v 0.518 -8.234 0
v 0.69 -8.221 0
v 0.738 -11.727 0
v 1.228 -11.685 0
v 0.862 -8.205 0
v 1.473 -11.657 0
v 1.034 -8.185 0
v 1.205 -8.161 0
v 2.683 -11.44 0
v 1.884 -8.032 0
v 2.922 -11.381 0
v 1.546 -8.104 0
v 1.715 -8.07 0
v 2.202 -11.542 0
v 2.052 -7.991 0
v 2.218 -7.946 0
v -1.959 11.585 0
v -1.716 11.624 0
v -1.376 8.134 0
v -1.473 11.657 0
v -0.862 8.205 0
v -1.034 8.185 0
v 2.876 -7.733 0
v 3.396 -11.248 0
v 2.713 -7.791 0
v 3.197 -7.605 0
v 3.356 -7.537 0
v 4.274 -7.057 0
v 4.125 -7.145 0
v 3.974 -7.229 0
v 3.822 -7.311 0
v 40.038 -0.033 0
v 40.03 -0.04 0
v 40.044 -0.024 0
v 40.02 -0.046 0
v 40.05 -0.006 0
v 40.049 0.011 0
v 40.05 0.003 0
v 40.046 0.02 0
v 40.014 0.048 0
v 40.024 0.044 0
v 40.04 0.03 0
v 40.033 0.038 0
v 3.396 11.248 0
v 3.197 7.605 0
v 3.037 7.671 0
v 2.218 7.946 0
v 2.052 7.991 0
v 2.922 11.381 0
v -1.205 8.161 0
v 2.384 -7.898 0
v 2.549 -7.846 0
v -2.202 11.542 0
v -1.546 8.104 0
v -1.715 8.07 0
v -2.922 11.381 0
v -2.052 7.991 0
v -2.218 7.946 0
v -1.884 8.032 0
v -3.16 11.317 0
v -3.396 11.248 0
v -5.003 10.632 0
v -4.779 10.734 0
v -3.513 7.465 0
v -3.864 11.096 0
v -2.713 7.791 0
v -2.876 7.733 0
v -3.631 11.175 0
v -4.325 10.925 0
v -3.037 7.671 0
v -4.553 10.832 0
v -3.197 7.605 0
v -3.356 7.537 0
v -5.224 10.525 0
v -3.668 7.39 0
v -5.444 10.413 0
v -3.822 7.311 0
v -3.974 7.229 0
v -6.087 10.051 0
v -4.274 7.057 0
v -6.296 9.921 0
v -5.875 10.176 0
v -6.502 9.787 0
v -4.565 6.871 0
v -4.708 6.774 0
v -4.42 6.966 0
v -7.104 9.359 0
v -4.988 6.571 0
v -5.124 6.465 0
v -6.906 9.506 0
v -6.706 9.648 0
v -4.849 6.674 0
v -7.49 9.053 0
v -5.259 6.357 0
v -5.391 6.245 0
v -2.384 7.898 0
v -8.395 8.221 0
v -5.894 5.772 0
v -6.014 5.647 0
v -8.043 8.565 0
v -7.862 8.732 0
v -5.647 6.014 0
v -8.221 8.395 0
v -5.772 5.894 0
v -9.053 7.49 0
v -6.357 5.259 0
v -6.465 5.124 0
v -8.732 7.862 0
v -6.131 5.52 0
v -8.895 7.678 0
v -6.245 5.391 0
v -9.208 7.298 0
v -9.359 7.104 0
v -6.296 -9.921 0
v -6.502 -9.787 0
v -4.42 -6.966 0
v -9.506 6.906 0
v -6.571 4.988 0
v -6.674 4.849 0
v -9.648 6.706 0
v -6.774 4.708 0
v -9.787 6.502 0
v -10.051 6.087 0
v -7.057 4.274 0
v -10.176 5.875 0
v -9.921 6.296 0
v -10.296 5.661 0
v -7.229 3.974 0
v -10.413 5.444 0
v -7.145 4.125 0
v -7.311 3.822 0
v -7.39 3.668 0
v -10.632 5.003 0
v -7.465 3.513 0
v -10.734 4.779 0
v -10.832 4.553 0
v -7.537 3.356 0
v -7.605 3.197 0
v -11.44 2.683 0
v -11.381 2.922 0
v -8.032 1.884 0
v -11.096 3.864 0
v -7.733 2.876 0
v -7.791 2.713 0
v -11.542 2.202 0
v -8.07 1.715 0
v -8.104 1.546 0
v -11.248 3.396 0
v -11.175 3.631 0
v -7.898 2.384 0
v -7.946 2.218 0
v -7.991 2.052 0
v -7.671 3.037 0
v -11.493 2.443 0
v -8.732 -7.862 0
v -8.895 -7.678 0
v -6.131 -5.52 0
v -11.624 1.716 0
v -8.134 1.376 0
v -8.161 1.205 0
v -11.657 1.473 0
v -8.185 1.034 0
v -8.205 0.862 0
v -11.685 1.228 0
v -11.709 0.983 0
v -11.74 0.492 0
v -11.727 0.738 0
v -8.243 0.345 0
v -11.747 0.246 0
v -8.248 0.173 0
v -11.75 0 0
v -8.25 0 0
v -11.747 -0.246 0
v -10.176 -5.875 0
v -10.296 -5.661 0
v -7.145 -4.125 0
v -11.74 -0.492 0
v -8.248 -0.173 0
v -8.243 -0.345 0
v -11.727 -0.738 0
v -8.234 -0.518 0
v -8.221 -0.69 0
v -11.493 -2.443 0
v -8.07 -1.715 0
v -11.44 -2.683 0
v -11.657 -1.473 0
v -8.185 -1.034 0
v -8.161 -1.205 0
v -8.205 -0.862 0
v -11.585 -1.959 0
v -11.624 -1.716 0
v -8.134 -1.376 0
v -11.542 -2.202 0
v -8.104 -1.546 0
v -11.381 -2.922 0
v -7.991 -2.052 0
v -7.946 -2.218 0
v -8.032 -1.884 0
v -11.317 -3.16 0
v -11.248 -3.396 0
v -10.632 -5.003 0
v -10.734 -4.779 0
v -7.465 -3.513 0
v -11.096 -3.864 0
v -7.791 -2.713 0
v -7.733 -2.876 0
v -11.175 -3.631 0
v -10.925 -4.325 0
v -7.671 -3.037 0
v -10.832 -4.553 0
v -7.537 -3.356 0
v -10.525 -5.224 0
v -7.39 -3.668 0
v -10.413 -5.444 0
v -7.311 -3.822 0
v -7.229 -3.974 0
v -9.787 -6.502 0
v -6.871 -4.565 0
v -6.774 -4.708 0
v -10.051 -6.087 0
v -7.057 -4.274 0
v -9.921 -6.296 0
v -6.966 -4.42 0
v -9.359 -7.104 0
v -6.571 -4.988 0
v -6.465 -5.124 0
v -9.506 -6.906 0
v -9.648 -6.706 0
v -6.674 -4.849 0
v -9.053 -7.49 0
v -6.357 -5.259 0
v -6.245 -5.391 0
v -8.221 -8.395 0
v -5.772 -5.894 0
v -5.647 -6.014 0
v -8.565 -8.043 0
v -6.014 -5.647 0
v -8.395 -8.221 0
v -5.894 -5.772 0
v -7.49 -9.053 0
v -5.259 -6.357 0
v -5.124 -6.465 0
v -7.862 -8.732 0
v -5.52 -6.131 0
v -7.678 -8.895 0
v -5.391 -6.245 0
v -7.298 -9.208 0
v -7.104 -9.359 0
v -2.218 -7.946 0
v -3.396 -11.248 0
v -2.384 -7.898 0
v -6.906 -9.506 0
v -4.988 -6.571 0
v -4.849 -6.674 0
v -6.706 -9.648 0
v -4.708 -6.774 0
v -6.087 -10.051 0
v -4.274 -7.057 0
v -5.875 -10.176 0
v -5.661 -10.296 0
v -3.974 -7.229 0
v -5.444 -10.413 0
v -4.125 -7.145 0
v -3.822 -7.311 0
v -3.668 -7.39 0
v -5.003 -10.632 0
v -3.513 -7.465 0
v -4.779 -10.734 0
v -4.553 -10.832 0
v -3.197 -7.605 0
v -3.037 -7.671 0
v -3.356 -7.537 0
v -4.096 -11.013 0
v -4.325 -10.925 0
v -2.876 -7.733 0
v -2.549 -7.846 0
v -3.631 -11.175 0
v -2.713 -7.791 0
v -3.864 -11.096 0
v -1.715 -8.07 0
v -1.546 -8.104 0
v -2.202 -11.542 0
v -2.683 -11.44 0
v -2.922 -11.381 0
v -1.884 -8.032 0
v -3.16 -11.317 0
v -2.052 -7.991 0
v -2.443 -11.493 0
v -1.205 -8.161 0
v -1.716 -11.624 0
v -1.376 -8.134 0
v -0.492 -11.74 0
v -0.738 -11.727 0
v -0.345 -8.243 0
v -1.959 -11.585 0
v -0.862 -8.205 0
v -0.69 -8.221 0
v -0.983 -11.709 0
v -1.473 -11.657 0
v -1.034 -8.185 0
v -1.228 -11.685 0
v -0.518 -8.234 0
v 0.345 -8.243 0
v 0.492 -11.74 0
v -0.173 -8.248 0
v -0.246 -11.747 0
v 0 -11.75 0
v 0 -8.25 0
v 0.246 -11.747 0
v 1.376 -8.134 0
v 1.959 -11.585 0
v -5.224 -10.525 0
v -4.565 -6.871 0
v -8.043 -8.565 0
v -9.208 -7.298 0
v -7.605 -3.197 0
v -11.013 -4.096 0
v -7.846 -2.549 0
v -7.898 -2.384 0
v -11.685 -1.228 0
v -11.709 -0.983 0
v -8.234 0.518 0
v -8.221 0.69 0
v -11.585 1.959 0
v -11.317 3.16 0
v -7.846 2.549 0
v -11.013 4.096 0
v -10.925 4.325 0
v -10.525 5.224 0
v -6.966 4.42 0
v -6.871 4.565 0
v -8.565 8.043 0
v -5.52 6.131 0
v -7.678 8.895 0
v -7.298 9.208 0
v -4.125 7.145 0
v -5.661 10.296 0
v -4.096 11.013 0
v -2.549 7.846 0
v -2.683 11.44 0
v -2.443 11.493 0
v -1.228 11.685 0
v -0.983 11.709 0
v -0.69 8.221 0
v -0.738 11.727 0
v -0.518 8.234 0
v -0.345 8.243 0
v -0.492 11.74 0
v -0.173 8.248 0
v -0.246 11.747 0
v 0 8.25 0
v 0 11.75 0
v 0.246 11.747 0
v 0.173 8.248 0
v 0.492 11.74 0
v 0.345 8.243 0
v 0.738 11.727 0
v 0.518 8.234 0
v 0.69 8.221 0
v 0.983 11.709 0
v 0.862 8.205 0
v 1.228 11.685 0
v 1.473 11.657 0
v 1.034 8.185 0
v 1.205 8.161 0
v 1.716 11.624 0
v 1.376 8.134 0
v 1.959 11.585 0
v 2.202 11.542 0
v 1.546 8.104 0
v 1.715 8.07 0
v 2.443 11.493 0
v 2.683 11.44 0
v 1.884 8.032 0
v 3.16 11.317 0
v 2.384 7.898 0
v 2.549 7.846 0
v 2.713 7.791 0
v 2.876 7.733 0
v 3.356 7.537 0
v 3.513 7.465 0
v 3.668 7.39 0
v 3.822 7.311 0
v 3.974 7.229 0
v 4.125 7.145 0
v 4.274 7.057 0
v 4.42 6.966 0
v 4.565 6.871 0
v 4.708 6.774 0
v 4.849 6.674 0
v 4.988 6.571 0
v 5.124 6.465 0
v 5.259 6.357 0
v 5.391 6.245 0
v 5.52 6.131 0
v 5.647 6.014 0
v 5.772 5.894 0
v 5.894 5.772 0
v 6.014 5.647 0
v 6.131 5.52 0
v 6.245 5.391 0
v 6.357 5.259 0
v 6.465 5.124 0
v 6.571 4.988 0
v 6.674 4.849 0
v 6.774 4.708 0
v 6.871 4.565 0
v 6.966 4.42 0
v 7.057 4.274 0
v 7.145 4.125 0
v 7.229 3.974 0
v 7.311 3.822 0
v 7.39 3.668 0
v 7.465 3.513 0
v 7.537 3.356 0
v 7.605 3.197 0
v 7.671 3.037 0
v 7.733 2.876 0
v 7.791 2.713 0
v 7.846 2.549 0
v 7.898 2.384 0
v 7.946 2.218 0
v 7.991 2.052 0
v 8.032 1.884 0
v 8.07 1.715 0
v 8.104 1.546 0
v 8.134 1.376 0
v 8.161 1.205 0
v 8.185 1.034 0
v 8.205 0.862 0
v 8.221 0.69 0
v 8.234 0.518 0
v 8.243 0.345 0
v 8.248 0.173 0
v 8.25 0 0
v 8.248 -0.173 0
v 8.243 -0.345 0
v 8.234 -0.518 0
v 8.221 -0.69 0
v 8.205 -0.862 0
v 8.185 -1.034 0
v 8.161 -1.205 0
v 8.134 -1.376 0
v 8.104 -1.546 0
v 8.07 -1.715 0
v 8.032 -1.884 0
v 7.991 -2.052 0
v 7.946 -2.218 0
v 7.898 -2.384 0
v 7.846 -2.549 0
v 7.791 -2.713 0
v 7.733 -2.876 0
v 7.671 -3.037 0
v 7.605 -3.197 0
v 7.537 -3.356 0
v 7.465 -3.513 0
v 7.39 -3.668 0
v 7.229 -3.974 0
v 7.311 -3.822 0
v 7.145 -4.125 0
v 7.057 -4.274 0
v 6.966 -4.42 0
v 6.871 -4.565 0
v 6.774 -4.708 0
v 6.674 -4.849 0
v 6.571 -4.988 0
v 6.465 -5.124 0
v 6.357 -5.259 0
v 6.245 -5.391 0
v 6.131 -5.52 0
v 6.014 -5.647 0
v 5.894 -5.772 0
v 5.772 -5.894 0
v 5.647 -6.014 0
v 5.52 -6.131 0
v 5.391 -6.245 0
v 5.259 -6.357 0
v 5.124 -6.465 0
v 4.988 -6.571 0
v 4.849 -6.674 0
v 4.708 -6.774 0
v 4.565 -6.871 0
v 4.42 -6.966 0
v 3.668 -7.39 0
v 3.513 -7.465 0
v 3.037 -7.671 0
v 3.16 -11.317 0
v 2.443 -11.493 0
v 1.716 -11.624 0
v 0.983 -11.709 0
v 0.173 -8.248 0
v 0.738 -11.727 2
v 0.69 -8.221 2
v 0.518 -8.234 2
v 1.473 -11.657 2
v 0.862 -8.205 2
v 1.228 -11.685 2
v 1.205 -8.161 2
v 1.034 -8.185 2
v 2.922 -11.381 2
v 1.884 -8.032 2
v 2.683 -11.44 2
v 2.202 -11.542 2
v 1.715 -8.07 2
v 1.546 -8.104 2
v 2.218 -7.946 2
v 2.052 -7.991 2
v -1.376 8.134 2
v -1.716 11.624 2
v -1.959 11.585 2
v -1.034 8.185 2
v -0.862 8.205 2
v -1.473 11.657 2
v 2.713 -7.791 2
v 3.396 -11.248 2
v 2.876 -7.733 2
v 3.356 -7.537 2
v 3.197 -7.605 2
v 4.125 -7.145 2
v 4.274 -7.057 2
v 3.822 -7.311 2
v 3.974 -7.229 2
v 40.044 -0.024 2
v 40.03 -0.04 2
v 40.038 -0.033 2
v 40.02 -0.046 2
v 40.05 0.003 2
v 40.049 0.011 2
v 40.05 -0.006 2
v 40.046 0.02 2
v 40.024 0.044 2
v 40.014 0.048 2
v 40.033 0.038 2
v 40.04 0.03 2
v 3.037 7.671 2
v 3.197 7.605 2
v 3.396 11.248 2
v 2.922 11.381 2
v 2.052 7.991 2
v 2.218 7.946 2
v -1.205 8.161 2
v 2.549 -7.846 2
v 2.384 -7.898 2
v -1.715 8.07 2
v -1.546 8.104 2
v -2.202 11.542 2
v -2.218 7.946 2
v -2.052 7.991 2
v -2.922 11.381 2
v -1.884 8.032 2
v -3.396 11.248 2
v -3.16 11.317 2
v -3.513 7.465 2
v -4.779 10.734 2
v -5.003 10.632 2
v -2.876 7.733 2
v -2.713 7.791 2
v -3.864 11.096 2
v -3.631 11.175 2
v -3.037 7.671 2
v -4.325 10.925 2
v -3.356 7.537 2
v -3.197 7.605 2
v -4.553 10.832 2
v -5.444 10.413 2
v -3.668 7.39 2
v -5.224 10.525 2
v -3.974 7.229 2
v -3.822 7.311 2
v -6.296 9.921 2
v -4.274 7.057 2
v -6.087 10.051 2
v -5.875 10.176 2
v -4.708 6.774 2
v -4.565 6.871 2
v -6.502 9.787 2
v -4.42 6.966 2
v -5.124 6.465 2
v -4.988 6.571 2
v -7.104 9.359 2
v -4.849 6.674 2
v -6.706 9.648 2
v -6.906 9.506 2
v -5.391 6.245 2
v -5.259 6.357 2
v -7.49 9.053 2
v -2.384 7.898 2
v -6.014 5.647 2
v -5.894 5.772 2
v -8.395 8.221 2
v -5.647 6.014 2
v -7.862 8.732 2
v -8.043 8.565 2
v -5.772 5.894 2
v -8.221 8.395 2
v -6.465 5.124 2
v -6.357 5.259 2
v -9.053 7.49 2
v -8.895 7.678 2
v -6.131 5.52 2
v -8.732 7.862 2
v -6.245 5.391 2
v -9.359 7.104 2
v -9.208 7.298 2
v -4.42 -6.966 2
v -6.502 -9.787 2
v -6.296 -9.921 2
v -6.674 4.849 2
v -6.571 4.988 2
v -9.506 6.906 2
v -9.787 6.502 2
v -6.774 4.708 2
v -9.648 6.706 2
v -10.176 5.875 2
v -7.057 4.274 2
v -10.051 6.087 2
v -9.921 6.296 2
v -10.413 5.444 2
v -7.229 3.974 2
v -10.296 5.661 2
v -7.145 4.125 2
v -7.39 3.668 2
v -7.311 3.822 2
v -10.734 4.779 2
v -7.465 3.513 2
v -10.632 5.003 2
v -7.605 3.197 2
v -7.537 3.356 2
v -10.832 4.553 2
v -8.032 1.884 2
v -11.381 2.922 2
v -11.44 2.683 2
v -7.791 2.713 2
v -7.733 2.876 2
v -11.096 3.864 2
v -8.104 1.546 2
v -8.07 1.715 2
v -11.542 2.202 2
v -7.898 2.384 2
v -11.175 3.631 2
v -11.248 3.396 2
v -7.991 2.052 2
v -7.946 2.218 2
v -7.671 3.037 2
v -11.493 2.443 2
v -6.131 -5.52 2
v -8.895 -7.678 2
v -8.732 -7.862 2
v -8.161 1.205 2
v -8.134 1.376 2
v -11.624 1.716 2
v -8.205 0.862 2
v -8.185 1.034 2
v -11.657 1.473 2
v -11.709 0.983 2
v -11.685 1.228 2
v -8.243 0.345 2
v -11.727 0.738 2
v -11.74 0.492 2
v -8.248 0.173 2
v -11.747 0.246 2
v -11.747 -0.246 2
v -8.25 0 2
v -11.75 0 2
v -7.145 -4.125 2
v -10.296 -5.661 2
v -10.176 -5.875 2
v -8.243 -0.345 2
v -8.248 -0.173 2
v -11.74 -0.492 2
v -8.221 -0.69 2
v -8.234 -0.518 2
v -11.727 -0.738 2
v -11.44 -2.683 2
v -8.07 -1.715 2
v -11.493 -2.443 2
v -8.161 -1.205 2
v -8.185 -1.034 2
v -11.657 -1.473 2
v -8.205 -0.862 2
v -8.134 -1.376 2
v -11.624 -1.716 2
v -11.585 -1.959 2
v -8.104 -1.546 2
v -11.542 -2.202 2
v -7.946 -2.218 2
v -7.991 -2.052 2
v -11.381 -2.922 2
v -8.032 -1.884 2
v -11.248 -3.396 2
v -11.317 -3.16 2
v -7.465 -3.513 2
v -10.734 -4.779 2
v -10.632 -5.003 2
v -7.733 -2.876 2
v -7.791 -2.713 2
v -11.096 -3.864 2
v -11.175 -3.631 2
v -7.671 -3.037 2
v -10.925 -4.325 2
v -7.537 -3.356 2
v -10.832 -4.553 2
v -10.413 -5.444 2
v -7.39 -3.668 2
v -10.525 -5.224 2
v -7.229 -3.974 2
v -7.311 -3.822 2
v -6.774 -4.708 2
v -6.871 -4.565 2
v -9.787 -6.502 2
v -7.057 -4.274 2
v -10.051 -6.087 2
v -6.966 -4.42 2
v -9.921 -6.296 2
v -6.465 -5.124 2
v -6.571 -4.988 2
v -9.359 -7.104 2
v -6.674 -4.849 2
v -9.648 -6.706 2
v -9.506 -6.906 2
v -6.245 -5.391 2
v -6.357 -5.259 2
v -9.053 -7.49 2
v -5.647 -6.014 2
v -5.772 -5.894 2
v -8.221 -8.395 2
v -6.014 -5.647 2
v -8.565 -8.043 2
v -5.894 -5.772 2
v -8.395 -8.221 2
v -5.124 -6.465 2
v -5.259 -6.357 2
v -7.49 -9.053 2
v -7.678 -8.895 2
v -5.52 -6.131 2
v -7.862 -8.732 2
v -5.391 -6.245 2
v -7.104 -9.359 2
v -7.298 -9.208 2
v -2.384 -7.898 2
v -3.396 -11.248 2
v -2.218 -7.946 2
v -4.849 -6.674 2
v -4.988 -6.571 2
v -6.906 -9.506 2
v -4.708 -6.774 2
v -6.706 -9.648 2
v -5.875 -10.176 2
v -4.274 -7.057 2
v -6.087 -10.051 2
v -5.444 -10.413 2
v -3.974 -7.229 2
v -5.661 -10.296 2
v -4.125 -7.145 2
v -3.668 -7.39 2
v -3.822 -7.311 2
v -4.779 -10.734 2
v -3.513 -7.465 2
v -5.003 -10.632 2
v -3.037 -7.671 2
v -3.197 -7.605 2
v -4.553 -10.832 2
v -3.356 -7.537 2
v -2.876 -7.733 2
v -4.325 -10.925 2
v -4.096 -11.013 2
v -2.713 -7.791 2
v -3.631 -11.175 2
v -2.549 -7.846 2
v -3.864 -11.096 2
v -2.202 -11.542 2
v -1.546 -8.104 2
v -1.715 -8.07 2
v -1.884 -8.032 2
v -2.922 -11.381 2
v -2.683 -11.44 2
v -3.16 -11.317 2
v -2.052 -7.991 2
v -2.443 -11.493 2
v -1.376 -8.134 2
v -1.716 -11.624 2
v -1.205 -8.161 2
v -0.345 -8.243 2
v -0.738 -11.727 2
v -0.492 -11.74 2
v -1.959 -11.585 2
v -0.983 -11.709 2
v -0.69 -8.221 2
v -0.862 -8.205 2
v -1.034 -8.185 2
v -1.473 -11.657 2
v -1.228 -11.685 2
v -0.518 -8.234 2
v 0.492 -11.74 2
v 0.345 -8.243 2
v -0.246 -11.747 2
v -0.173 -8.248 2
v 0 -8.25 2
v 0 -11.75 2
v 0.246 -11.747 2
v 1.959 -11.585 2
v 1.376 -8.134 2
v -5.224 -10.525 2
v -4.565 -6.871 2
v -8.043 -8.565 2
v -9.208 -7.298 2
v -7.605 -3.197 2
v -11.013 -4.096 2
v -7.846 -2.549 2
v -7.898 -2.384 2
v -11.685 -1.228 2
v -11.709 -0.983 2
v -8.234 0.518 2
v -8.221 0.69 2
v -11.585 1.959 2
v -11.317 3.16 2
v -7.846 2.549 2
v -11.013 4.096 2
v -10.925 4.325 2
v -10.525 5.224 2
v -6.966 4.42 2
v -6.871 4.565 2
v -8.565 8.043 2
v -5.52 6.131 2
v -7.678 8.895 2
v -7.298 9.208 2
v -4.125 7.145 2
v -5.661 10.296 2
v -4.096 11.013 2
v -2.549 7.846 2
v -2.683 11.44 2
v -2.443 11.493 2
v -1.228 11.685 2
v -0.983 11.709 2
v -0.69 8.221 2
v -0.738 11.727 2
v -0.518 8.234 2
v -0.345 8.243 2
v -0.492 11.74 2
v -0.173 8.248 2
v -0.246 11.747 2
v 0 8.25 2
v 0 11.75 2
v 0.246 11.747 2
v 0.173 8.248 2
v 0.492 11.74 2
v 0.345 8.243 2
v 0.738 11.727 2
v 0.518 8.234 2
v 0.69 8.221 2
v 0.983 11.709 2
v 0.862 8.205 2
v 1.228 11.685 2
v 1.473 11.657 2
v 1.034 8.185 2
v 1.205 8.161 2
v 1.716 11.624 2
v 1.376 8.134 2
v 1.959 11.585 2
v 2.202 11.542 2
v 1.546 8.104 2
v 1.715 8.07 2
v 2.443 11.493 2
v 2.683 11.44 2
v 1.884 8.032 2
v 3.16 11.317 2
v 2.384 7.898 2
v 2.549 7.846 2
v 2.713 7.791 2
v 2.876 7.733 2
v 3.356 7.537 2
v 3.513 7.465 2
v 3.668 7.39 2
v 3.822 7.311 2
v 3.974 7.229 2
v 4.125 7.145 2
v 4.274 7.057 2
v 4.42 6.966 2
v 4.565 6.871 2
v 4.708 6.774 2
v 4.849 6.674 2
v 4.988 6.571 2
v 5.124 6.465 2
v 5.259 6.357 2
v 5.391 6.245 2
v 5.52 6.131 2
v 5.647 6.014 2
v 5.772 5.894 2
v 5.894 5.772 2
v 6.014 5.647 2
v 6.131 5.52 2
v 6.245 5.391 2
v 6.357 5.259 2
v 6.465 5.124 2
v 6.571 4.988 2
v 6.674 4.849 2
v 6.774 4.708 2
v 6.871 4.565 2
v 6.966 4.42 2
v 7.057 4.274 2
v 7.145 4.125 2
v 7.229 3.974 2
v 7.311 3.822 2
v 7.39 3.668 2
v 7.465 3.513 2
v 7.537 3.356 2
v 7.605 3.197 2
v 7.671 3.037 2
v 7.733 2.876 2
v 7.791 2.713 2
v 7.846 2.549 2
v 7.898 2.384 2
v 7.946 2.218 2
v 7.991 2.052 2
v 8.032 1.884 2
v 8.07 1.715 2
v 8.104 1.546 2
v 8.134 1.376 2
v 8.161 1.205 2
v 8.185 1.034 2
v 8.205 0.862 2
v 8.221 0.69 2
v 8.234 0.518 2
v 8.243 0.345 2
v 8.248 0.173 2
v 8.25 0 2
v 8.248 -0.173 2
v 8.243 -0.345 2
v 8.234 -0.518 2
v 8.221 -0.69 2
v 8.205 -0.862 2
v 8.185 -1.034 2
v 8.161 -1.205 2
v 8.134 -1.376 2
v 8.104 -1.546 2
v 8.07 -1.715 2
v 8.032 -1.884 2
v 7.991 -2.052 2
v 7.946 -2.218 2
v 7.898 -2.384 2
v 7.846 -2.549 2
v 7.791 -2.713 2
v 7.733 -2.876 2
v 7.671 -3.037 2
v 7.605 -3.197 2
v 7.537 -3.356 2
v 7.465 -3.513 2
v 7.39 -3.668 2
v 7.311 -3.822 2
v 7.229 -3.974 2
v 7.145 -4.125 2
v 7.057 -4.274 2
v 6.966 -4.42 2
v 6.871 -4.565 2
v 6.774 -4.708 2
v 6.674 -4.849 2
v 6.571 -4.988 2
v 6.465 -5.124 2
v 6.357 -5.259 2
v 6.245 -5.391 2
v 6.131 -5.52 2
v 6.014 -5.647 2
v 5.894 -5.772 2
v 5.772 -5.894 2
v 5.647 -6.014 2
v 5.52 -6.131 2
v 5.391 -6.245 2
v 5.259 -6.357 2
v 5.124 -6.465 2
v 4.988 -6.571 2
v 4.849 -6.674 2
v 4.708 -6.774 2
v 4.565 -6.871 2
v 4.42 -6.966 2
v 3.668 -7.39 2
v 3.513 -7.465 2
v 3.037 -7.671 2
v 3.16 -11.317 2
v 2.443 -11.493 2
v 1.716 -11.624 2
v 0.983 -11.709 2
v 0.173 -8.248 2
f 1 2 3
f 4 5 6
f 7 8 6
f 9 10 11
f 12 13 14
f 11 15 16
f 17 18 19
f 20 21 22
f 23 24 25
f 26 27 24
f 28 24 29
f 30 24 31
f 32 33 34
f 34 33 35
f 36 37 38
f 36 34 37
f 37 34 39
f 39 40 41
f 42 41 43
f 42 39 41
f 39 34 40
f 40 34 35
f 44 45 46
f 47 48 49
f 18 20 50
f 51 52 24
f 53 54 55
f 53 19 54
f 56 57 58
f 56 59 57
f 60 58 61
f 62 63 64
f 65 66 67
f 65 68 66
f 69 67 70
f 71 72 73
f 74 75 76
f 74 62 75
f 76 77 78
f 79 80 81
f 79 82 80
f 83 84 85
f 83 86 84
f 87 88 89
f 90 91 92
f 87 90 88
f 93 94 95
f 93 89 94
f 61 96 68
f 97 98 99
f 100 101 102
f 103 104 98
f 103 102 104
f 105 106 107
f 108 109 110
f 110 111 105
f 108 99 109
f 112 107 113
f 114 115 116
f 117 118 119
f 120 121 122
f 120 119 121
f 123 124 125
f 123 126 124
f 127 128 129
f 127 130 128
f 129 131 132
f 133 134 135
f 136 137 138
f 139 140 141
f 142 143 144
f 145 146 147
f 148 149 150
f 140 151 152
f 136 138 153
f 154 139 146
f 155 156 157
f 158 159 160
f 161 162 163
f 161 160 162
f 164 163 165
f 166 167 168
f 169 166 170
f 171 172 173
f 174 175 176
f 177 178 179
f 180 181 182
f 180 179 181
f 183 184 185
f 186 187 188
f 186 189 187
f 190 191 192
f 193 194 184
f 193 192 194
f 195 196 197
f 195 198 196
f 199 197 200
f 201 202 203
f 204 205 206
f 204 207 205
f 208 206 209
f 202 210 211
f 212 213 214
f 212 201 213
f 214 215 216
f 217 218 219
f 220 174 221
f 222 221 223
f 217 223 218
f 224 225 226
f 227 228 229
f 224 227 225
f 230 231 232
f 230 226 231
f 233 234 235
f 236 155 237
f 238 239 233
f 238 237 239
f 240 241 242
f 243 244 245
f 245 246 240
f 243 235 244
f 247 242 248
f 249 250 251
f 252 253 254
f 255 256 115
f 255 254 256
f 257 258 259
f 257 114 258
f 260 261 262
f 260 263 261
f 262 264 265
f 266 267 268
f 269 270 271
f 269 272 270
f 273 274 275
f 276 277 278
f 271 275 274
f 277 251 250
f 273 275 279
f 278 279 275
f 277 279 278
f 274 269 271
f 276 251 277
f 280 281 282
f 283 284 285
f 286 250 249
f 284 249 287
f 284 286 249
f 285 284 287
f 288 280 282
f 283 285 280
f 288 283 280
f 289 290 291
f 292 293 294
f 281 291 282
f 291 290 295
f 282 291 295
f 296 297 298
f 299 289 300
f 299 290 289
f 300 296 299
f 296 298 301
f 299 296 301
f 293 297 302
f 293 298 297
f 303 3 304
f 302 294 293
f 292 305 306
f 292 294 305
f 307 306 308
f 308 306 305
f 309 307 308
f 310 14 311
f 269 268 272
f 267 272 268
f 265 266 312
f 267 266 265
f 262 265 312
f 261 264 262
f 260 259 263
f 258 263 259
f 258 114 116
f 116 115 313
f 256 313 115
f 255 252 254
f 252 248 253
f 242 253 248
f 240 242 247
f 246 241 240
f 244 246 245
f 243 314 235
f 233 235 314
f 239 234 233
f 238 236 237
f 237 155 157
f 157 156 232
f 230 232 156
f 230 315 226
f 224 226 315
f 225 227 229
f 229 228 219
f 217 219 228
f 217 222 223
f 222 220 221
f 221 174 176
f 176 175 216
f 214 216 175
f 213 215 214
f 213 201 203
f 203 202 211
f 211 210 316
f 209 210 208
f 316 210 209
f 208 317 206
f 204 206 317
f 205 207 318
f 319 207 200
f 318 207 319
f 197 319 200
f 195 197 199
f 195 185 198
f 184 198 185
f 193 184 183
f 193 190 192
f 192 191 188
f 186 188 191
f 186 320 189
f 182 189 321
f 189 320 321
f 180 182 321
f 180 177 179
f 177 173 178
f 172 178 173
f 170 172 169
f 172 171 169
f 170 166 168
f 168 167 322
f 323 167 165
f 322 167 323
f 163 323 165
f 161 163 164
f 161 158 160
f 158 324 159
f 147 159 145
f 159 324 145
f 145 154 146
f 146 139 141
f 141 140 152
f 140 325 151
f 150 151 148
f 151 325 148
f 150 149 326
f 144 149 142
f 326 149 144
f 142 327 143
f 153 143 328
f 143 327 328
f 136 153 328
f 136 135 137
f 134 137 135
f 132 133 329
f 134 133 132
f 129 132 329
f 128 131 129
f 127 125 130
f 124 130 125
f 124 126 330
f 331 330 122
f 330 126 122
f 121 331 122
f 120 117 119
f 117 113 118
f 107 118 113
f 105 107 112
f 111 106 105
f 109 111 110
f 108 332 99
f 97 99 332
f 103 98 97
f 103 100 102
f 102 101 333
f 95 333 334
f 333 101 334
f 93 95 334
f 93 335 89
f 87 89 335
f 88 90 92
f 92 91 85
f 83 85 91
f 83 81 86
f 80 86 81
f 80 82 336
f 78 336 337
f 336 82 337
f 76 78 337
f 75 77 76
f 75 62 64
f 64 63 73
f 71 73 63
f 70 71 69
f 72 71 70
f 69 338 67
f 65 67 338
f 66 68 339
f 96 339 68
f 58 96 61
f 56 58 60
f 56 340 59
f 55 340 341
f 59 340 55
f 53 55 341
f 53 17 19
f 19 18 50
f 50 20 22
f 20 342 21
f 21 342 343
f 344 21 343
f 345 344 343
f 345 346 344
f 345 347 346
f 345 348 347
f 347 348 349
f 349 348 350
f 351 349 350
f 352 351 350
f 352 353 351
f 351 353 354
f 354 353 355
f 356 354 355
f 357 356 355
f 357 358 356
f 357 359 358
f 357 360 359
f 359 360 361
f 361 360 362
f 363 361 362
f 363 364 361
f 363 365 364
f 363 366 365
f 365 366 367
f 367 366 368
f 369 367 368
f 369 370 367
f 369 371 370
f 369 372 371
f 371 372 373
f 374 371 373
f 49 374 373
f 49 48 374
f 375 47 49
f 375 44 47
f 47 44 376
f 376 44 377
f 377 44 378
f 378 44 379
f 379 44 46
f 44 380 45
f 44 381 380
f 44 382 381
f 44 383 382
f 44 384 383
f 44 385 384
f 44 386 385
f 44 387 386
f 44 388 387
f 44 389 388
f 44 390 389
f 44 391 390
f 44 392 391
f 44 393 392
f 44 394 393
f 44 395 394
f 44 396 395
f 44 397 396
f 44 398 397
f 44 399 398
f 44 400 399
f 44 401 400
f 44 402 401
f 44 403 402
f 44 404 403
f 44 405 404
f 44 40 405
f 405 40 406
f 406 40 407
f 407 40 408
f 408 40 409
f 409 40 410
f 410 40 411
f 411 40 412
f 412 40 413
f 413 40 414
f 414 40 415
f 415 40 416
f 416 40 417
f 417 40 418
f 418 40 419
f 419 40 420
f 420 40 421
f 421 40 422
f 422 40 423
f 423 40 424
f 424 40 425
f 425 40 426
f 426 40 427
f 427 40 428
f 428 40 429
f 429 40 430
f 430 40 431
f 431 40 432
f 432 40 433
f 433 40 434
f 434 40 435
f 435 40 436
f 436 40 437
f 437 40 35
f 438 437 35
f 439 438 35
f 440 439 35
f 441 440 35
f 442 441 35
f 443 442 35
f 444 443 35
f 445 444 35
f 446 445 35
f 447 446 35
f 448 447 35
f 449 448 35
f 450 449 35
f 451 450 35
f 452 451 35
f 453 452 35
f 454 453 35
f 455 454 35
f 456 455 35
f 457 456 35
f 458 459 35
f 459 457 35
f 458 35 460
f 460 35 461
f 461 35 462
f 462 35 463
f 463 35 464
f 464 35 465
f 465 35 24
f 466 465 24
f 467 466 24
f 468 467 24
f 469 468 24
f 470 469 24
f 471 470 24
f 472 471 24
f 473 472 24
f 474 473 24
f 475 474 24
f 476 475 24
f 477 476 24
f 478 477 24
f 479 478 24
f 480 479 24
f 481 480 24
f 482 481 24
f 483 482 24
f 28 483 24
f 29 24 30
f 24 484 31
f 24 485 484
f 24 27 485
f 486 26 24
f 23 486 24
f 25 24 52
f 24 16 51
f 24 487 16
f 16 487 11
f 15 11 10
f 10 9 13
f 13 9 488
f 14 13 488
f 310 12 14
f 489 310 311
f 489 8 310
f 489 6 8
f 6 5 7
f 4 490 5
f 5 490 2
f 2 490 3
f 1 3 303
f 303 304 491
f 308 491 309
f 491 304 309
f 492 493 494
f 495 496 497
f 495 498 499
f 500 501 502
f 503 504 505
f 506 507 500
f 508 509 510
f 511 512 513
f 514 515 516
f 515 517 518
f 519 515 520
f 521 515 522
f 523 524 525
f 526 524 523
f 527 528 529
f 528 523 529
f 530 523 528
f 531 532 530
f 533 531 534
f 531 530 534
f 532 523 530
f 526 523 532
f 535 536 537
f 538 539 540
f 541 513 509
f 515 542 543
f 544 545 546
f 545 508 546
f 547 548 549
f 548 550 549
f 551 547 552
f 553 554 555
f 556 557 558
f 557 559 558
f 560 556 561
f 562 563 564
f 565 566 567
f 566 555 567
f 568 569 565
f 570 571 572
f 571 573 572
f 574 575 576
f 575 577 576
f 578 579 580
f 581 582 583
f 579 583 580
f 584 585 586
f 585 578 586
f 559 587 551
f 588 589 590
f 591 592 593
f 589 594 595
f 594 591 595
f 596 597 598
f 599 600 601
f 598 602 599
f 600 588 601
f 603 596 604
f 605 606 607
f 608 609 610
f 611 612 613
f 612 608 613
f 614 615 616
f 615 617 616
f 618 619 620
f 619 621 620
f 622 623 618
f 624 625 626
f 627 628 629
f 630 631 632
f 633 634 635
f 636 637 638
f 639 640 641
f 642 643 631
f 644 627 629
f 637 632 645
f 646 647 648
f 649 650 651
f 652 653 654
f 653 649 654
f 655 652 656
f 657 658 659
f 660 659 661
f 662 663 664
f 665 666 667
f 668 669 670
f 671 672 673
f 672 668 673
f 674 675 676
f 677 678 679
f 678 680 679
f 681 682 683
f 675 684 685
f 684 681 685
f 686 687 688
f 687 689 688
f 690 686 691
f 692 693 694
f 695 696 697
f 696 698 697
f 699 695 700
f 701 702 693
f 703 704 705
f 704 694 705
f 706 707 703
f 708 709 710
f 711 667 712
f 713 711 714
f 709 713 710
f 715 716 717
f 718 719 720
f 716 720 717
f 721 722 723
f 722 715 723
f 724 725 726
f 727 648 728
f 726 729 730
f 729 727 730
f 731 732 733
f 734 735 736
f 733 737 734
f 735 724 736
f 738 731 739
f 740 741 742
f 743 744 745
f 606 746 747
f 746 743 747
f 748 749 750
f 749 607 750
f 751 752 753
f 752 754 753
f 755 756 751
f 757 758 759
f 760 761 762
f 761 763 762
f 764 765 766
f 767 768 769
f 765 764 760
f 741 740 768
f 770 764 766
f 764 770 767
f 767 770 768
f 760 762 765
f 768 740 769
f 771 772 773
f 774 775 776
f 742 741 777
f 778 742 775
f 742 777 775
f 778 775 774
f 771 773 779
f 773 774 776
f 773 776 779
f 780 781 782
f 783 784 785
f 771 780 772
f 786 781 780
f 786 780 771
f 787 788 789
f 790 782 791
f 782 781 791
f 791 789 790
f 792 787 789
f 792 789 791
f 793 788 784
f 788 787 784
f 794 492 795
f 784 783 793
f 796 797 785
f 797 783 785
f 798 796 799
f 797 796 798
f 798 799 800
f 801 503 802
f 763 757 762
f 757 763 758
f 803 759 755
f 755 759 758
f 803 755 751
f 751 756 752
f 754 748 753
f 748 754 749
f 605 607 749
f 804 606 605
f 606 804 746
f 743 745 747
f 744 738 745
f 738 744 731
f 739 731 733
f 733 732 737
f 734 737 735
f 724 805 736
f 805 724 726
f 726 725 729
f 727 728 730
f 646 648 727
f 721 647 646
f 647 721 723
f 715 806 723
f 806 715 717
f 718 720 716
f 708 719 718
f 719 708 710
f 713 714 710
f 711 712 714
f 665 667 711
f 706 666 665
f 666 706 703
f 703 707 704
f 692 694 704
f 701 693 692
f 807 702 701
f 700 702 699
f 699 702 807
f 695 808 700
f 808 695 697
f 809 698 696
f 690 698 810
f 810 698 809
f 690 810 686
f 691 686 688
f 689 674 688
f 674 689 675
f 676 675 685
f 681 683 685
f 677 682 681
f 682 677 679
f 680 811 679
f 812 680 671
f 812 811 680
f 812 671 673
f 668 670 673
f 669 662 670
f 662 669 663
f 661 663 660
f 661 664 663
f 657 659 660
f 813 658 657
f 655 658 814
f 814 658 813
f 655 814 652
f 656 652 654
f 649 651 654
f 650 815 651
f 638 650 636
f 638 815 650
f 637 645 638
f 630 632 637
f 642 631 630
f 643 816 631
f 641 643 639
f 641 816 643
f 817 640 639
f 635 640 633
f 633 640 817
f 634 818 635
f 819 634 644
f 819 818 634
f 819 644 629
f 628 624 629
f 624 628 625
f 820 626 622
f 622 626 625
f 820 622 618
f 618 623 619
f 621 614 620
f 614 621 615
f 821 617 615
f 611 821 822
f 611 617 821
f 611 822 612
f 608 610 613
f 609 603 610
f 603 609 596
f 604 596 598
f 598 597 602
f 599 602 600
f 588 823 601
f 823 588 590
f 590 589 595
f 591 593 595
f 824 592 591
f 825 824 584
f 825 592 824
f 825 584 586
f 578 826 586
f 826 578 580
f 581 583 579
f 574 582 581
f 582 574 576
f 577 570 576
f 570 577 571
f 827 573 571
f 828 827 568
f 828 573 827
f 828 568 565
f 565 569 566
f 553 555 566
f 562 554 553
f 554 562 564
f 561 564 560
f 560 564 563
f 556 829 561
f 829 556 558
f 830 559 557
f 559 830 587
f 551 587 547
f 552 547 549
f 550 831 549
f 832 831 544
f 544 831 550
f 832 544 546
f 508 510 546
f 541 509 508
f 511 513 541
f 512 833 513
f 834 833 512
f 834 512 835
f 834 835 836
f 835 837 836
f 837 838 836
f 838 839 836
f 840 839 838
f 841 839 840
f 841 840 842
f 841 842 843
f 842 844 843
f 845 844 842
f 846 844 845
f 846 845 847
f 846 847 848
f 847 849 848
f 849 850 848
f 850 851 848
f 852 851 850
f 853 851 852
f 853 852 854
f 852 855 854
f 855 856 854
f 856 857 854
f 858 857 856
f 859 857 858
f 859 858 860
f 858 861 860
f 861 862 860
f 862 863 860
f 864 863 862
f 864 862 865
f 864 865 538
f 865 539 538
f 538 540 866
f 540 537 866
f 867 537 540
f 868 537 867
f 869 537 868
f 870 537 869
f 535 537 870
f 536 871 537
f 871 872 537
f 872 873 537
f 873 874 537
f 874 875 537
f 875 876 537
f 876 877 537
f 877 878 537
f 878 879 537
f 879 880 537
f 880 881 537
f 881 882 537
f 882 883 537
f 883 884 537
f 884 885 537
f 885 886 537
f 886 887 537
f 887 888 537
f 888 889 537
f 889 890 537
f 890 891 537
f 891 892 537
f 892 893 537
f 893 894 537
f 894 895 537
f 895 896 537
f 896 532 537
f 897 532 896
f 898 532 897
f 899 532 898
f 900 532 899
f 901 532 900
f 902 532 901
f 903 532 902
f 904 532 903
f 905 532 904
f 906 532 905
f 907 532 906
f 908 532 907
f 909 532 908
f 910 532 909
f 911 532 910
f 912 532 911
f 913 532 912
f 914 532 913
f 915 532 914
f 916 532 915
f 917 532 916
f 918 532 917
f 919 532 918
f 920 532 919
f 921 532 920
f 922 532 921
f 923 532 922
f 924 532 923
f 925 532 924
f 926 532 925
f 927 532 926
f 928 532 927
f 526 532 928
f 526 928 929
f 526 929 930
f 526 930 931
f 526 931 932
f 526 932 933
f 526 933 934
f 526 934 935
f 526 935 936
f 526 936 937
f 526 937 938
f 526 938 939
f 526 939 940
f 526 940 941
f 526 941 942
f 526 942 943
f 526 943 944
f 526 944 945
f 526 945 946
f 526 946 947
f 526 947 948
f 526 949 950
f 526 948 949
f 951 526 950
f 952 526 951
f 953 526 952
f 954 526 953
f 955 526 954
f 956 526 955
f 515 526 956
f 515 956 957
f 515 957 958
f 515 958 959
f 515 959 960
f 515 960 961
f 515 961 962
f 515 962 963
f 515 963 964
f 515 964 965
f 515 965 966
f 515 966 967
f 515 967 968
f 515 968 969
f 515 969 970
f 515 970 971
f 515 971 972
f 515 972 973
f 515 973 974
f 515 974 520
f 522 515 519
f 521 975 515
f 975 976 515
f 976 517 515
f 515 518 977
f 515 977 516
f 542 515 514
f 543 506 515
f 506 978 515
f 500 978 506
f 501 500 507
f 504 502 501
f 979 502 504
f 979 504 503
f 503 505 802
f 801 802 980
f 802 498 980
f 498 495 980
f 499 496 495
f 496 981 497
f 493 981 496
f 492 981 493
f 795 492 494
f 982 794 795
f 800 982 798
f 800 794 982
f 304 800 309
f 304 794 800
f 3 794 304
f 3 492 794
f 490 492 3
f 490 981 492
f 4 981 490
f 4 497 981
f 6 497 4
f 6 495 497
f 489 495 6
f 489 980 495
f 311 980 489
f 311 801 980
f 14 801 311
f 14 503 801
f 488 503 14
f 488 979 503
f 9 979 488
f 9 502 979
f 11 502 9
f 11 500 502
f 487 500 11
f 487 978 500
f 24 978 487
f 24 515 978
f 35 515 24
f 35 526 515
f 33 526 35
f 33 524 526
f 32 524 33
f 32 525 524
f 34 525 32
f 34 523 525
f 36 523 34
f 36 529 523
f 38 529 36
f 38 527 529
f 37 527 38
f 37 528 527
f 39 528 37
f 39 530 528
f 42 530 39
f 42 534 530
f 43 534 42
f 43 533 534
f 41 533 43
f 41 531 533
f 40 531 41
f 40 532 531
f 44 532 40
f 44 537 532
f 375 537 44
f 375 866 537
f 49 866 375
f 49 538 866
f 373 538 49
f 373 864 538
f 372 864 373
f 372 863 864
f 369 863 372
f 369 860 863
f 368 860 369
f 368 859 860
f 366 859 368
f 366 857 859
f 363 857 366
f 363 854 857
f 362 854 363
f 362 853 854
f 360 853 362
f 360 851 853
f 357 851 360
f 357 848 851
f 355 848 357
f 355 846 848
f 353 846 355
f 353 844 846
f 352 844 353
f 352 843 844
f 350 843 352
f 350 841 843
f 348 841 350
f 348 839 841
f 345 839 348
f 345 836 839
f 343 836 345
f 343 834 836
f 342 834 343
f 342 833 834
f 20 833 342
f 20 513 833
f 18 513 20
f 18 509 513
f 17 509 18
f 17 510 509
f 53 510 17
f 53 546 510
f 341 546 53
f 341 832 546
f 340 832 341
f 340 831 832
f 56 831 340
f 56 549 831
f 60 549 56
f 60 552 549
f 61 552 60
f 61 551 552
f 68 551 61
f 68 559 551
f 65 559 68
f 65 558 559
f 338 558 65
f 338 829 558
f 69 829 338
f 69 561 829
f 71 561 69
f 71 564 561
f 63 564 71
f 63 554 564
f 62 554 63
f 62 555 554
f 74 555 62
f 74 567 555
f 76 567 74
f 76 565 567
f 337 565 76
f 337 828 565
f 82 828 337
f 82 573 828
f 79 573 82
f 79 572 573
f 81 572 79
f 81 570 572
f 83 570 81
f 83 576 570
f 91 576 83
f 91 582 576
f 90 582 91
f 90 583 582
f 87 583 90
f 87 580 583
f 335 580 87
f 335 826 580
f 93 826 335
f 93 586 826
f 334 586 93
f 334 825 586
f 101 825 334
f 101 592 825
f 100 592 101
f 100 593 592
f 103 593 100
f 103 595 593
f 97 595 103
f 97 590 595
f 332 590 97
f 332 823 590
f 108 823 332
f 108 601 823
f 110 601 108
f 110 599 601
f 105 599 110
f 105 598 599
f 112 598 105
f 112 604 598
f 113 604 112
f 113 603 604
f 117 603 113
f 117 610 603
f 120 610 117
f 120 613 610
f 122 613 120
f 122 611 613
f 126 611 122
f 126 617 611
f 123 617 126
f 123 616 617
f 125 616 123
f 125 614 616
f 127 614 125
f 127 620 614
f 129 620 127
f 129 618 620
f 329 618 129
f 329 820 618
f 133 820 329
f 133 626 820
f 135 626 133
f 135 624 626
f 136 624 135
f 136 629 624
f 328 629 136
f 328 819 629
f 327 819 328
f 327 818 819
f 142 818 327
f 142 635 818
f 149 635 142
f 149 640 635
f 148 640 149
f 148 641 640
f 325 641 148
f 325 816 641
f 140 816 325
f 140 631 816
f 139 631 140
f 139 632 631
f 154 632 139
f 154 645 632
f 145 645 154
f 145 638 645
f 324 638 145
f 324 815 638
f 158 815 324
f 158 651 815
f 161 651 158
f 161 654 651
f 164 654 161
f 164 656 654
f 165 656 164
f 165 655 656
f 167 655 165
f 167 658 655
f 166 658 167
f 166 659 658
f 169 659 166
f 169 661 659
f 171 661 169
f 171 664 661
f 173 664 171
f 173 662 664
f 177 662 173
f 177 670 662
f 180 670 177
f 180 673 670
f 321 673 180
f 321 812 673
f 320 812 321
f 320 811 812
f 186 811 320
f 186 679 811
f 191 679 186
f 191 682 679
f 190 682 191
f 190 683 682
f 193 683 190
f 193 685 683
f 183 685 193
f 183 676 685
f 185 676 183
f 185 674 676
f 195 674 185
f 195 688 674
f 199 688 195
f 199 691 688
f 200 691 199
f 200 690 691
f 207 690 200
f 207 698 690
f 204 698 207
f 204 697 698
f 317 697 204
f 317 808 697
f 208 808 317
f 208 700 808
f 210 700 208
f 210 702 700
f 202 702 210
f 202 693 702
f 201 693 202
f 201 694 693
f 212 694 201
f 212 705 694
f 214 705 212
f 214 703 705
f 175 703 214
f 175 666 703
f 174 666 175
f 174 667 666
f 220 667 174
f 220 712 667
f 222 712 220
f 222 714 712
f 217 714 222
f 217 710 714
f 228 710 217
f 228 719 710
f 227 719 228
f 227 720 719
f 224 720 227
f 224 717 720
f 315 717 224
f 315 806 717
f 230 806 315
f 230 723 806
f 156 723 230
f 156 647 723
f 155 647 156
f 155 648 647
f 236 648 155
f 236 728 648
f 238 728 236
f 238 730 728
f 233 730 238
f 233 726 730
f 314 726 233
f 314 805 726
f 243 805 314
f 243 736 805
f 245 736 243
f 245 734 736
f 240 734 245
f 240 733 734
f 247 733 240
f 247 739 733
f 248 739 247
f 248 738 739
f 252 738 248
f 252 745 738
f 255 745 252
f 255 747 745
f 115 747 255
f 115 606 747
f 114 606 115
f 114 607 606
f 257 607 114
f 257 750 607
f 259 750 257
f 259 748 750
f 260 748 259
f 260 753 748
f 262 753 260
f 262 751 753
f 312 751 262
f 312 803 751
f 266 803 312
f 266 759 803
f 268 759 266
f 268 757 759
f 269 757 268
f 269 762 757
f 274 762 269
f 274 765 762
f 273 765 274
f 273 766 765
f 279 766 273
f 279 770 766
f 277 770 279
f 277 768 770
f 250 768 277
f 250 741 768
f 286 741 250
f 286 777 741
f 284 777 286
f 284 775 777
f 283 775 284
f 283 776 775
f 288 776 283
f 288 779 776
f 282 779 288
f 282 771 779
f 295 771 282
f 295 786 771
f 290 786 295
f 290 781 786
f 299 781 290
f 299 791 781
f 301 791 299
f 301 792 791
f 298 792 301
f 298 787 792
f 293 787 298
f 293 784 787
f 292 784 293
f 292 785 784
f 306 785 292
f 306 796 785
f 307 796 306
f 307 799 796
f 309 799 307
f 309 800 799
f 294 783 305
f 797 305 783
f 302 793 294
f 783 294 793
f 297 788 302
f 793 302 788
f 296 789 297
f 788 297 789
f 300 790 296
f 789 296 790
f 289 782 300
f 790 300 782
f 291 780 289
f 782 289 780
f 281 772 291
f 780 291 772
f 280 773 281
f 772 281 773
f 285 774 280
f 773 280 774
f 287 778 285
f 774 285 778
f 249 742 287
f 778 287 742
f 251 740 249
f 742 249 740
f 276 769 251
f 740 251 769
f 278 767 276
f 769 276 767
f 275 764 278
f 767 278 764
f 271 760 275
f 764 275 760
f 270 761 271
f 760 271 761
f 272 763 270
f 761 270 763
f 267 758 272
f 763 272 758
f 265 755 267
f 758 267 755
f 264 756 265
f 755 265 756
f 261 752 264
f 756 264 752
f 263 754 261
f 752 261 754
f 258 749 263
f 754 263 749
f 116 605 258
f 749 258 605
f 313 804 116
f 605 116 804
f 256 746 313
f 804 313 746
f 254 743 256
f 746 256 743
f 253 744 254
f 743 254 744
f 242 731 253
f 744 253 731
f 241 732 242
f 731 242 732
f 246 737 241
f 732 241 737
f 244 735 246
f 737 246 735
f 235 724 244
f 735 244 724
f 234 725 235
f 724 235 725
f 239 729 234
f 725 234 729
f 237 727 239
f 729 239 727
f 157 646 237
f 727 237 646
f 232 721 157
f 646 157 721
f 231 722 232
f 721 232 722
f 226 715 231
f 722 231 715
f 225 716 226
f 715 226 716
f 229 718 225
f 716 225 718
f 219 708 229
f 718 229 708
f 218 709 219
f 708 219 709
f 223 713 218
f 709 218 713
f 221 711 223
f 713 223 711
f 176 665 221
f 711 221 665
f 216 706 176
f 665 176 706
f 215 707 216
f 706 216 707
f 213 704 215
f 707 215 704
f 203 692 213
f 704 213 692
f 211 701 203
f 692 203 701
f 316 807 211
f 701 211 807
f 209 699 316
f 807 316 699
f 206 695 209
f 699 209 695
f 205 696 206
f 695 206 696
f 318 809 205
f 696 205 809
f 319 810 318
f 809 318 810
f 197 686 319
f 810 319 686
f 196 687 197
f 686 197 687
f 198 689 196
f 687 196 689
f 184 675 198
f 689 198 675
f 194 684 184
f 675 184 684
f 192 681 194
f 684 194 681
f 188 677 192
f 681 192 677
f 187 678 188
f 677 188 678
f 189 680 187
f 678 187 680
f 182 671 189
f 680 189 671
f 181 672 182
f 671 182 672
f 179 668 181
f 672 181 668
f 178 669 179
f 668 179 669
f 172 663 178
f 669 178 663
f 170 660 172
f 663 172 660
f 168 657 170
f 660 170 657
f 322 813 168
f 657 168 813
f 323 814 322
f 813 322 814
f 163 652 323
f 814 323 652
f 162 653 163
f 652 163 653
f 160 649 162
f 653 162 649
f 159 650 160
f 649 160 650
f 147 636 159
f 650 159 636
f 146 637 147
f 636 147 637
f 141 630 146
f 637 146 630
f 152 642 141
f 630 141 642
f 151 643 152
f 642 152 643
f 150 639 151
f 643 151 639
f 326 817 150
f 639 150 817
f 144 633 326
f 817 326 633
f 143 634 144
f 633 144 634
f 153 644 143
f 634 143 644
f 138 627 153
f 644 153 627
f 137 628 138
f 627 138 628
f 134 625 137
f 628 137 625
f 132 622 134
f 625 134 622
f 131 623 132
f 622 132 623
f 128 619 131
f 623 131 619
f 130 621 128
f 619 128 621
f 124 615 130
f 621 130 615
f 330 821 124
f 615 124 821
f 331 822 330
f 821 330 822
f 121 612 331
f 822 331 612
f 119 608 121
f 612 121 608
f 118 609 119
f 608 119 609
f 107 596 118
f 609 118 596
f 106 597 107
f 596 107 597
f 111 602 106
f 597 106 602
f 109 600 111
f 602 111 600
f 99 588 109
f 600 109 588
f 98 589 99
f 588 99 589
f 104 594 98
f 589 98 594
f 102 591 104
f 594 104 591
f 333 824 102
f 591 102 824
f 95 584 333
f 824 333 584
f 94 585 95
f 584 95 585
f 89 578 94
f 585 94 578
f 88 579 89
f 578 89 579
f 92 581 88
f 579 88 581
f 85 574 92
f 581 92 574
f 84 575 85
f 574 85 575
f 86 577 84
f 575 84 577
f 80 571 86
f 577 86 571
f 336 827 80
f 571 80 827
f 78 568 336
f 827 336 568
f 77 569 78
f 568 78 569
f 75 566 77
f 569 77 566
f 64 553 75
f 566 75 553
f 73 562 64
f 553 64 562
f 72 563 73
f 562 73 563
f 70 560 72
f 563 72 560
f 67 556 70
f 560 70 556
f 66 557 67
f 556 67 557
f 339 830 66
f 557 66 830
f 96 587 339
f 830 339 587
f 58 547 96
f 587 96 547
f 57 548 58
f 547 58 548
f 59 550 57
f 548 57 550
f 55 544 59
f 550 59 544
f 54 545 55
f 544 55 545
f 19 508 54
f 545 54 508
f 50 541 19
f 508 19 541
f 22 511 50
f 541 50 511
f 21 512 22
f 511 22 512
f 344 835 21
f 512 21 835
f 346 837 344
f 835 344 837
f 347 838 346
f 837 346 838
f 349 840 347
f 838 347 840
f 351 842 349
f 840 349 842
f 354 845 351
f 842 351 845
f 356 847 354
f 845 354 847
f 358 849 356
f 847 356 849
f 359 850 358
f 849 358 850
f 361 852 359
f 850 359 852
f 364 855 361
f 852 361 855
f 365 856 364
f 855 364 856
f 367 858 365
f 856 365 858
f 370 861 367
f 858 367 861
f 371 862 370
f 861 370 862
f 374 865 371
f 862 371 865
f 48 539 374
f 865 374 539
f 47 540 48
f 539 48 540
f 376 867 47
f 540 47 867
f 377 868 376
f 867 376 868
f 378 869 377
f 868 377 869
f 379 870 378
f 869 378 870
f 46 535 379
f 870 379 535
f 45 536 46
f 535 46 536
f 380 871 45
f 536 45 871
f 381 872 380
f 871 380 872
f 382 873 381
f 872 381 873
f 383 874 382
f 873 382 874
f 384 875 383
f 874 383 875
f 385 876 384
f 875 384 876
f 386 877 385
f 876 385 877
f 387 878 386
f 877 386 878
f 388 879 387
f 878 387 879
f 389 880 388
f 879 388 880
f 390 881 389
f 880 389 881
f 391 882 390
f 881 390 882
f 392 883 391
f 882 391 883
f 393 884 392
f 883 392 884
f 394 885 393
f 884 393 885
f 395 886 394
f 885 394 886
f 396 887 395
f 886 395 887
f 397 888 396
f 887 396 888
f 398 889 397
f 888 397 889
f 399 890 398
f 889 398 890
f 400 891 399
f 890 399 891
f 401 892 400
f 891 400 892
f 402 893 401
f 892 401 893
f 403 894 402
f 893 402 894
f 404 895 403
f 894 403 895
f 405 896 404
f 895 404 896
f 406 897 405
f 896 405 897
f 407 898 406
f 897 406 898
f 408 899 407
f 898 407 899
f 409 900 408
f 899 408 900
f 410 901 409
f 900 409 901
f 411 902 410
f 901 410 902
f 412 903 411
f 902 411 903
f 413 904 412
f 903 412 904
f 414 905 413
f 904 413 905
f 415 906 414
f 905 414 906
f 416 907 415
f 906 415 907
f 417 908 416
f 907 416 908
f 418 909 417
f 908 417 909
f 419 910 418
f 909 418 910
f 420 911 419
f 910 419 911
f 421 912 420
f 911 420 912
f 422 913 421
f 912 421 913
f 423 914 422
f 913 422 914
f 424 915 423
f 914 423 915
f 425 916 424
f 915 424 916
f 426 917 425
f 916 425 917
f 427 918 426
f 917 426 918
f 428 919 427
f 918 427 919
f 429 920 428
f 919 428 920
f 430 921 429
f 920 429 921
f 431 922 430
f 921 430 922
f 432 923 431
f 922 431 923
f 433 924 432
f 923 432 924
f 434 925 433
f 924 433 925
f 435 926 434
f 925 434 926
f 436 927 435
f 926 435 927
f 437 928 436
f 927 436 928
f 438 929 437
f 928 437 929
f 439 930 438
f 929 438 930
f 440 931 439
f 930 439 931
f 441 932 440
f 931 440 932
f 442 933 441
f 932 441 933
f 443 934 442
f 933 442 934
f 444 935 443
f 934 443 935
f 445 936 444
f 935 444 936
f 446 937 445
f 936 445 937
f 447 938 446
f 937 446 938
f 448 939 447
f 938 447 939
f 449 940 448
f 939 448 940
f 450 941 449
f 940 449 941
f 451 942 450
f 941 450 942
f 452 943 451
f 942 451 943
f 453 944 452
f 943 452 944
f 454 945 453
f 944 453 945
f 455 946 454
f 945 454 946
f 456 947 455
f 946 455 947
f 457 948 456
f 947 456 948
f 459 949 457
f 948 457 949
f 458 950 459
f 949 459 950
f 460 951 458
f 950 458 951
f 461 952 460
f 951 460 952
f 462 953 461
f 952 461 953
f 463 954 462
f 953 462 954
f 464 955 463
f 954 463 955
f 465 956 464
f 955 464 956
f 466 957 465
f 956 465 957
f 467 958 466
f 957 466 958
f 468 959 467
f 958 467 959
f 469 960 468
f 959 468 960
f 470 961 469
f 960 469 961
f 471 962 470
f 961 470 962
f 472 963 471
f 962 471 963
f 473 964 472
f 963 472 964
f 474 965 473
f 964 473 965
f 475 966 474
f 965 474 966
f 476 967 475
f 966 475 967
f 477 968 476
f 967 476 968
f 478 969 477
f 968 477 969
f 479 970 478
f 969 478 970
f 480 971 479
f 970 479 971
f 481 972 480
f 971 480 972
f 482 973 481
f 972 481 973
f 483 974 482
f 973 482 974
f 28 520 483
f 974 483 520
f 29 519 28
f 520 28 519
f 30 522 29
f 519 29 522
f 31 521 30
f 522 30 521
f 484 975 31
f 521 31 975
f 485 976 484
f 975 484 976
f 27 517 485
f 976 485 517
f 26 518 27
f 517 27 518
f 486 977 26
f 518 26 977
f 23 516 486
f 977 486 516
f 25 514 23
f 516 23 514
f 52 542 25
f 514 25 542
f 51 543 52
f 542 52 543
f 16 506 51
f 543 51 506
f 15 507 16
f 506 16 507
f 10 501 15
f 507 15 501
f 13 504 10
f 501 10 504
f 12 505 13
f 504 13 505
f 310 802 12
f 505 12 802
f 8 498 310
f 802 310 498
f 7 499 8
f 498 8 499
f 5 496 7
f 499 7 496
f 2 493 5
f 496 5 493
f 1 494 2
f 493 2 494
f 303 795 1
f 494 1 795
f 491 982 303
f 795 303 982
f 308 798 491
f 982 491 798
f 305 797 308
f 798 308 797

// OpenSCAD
module sonar_cut() {
    linear_extrude(0.2) 
        difference() {
            hull() {
                circle(d=1.65+0.7);
                translate([4, 0, 0]) circle(d=0.01);
            }
            circle(d=1.65);
        }
}

$fn=300;
scale([10, 10, 10]) sonar_cut();
